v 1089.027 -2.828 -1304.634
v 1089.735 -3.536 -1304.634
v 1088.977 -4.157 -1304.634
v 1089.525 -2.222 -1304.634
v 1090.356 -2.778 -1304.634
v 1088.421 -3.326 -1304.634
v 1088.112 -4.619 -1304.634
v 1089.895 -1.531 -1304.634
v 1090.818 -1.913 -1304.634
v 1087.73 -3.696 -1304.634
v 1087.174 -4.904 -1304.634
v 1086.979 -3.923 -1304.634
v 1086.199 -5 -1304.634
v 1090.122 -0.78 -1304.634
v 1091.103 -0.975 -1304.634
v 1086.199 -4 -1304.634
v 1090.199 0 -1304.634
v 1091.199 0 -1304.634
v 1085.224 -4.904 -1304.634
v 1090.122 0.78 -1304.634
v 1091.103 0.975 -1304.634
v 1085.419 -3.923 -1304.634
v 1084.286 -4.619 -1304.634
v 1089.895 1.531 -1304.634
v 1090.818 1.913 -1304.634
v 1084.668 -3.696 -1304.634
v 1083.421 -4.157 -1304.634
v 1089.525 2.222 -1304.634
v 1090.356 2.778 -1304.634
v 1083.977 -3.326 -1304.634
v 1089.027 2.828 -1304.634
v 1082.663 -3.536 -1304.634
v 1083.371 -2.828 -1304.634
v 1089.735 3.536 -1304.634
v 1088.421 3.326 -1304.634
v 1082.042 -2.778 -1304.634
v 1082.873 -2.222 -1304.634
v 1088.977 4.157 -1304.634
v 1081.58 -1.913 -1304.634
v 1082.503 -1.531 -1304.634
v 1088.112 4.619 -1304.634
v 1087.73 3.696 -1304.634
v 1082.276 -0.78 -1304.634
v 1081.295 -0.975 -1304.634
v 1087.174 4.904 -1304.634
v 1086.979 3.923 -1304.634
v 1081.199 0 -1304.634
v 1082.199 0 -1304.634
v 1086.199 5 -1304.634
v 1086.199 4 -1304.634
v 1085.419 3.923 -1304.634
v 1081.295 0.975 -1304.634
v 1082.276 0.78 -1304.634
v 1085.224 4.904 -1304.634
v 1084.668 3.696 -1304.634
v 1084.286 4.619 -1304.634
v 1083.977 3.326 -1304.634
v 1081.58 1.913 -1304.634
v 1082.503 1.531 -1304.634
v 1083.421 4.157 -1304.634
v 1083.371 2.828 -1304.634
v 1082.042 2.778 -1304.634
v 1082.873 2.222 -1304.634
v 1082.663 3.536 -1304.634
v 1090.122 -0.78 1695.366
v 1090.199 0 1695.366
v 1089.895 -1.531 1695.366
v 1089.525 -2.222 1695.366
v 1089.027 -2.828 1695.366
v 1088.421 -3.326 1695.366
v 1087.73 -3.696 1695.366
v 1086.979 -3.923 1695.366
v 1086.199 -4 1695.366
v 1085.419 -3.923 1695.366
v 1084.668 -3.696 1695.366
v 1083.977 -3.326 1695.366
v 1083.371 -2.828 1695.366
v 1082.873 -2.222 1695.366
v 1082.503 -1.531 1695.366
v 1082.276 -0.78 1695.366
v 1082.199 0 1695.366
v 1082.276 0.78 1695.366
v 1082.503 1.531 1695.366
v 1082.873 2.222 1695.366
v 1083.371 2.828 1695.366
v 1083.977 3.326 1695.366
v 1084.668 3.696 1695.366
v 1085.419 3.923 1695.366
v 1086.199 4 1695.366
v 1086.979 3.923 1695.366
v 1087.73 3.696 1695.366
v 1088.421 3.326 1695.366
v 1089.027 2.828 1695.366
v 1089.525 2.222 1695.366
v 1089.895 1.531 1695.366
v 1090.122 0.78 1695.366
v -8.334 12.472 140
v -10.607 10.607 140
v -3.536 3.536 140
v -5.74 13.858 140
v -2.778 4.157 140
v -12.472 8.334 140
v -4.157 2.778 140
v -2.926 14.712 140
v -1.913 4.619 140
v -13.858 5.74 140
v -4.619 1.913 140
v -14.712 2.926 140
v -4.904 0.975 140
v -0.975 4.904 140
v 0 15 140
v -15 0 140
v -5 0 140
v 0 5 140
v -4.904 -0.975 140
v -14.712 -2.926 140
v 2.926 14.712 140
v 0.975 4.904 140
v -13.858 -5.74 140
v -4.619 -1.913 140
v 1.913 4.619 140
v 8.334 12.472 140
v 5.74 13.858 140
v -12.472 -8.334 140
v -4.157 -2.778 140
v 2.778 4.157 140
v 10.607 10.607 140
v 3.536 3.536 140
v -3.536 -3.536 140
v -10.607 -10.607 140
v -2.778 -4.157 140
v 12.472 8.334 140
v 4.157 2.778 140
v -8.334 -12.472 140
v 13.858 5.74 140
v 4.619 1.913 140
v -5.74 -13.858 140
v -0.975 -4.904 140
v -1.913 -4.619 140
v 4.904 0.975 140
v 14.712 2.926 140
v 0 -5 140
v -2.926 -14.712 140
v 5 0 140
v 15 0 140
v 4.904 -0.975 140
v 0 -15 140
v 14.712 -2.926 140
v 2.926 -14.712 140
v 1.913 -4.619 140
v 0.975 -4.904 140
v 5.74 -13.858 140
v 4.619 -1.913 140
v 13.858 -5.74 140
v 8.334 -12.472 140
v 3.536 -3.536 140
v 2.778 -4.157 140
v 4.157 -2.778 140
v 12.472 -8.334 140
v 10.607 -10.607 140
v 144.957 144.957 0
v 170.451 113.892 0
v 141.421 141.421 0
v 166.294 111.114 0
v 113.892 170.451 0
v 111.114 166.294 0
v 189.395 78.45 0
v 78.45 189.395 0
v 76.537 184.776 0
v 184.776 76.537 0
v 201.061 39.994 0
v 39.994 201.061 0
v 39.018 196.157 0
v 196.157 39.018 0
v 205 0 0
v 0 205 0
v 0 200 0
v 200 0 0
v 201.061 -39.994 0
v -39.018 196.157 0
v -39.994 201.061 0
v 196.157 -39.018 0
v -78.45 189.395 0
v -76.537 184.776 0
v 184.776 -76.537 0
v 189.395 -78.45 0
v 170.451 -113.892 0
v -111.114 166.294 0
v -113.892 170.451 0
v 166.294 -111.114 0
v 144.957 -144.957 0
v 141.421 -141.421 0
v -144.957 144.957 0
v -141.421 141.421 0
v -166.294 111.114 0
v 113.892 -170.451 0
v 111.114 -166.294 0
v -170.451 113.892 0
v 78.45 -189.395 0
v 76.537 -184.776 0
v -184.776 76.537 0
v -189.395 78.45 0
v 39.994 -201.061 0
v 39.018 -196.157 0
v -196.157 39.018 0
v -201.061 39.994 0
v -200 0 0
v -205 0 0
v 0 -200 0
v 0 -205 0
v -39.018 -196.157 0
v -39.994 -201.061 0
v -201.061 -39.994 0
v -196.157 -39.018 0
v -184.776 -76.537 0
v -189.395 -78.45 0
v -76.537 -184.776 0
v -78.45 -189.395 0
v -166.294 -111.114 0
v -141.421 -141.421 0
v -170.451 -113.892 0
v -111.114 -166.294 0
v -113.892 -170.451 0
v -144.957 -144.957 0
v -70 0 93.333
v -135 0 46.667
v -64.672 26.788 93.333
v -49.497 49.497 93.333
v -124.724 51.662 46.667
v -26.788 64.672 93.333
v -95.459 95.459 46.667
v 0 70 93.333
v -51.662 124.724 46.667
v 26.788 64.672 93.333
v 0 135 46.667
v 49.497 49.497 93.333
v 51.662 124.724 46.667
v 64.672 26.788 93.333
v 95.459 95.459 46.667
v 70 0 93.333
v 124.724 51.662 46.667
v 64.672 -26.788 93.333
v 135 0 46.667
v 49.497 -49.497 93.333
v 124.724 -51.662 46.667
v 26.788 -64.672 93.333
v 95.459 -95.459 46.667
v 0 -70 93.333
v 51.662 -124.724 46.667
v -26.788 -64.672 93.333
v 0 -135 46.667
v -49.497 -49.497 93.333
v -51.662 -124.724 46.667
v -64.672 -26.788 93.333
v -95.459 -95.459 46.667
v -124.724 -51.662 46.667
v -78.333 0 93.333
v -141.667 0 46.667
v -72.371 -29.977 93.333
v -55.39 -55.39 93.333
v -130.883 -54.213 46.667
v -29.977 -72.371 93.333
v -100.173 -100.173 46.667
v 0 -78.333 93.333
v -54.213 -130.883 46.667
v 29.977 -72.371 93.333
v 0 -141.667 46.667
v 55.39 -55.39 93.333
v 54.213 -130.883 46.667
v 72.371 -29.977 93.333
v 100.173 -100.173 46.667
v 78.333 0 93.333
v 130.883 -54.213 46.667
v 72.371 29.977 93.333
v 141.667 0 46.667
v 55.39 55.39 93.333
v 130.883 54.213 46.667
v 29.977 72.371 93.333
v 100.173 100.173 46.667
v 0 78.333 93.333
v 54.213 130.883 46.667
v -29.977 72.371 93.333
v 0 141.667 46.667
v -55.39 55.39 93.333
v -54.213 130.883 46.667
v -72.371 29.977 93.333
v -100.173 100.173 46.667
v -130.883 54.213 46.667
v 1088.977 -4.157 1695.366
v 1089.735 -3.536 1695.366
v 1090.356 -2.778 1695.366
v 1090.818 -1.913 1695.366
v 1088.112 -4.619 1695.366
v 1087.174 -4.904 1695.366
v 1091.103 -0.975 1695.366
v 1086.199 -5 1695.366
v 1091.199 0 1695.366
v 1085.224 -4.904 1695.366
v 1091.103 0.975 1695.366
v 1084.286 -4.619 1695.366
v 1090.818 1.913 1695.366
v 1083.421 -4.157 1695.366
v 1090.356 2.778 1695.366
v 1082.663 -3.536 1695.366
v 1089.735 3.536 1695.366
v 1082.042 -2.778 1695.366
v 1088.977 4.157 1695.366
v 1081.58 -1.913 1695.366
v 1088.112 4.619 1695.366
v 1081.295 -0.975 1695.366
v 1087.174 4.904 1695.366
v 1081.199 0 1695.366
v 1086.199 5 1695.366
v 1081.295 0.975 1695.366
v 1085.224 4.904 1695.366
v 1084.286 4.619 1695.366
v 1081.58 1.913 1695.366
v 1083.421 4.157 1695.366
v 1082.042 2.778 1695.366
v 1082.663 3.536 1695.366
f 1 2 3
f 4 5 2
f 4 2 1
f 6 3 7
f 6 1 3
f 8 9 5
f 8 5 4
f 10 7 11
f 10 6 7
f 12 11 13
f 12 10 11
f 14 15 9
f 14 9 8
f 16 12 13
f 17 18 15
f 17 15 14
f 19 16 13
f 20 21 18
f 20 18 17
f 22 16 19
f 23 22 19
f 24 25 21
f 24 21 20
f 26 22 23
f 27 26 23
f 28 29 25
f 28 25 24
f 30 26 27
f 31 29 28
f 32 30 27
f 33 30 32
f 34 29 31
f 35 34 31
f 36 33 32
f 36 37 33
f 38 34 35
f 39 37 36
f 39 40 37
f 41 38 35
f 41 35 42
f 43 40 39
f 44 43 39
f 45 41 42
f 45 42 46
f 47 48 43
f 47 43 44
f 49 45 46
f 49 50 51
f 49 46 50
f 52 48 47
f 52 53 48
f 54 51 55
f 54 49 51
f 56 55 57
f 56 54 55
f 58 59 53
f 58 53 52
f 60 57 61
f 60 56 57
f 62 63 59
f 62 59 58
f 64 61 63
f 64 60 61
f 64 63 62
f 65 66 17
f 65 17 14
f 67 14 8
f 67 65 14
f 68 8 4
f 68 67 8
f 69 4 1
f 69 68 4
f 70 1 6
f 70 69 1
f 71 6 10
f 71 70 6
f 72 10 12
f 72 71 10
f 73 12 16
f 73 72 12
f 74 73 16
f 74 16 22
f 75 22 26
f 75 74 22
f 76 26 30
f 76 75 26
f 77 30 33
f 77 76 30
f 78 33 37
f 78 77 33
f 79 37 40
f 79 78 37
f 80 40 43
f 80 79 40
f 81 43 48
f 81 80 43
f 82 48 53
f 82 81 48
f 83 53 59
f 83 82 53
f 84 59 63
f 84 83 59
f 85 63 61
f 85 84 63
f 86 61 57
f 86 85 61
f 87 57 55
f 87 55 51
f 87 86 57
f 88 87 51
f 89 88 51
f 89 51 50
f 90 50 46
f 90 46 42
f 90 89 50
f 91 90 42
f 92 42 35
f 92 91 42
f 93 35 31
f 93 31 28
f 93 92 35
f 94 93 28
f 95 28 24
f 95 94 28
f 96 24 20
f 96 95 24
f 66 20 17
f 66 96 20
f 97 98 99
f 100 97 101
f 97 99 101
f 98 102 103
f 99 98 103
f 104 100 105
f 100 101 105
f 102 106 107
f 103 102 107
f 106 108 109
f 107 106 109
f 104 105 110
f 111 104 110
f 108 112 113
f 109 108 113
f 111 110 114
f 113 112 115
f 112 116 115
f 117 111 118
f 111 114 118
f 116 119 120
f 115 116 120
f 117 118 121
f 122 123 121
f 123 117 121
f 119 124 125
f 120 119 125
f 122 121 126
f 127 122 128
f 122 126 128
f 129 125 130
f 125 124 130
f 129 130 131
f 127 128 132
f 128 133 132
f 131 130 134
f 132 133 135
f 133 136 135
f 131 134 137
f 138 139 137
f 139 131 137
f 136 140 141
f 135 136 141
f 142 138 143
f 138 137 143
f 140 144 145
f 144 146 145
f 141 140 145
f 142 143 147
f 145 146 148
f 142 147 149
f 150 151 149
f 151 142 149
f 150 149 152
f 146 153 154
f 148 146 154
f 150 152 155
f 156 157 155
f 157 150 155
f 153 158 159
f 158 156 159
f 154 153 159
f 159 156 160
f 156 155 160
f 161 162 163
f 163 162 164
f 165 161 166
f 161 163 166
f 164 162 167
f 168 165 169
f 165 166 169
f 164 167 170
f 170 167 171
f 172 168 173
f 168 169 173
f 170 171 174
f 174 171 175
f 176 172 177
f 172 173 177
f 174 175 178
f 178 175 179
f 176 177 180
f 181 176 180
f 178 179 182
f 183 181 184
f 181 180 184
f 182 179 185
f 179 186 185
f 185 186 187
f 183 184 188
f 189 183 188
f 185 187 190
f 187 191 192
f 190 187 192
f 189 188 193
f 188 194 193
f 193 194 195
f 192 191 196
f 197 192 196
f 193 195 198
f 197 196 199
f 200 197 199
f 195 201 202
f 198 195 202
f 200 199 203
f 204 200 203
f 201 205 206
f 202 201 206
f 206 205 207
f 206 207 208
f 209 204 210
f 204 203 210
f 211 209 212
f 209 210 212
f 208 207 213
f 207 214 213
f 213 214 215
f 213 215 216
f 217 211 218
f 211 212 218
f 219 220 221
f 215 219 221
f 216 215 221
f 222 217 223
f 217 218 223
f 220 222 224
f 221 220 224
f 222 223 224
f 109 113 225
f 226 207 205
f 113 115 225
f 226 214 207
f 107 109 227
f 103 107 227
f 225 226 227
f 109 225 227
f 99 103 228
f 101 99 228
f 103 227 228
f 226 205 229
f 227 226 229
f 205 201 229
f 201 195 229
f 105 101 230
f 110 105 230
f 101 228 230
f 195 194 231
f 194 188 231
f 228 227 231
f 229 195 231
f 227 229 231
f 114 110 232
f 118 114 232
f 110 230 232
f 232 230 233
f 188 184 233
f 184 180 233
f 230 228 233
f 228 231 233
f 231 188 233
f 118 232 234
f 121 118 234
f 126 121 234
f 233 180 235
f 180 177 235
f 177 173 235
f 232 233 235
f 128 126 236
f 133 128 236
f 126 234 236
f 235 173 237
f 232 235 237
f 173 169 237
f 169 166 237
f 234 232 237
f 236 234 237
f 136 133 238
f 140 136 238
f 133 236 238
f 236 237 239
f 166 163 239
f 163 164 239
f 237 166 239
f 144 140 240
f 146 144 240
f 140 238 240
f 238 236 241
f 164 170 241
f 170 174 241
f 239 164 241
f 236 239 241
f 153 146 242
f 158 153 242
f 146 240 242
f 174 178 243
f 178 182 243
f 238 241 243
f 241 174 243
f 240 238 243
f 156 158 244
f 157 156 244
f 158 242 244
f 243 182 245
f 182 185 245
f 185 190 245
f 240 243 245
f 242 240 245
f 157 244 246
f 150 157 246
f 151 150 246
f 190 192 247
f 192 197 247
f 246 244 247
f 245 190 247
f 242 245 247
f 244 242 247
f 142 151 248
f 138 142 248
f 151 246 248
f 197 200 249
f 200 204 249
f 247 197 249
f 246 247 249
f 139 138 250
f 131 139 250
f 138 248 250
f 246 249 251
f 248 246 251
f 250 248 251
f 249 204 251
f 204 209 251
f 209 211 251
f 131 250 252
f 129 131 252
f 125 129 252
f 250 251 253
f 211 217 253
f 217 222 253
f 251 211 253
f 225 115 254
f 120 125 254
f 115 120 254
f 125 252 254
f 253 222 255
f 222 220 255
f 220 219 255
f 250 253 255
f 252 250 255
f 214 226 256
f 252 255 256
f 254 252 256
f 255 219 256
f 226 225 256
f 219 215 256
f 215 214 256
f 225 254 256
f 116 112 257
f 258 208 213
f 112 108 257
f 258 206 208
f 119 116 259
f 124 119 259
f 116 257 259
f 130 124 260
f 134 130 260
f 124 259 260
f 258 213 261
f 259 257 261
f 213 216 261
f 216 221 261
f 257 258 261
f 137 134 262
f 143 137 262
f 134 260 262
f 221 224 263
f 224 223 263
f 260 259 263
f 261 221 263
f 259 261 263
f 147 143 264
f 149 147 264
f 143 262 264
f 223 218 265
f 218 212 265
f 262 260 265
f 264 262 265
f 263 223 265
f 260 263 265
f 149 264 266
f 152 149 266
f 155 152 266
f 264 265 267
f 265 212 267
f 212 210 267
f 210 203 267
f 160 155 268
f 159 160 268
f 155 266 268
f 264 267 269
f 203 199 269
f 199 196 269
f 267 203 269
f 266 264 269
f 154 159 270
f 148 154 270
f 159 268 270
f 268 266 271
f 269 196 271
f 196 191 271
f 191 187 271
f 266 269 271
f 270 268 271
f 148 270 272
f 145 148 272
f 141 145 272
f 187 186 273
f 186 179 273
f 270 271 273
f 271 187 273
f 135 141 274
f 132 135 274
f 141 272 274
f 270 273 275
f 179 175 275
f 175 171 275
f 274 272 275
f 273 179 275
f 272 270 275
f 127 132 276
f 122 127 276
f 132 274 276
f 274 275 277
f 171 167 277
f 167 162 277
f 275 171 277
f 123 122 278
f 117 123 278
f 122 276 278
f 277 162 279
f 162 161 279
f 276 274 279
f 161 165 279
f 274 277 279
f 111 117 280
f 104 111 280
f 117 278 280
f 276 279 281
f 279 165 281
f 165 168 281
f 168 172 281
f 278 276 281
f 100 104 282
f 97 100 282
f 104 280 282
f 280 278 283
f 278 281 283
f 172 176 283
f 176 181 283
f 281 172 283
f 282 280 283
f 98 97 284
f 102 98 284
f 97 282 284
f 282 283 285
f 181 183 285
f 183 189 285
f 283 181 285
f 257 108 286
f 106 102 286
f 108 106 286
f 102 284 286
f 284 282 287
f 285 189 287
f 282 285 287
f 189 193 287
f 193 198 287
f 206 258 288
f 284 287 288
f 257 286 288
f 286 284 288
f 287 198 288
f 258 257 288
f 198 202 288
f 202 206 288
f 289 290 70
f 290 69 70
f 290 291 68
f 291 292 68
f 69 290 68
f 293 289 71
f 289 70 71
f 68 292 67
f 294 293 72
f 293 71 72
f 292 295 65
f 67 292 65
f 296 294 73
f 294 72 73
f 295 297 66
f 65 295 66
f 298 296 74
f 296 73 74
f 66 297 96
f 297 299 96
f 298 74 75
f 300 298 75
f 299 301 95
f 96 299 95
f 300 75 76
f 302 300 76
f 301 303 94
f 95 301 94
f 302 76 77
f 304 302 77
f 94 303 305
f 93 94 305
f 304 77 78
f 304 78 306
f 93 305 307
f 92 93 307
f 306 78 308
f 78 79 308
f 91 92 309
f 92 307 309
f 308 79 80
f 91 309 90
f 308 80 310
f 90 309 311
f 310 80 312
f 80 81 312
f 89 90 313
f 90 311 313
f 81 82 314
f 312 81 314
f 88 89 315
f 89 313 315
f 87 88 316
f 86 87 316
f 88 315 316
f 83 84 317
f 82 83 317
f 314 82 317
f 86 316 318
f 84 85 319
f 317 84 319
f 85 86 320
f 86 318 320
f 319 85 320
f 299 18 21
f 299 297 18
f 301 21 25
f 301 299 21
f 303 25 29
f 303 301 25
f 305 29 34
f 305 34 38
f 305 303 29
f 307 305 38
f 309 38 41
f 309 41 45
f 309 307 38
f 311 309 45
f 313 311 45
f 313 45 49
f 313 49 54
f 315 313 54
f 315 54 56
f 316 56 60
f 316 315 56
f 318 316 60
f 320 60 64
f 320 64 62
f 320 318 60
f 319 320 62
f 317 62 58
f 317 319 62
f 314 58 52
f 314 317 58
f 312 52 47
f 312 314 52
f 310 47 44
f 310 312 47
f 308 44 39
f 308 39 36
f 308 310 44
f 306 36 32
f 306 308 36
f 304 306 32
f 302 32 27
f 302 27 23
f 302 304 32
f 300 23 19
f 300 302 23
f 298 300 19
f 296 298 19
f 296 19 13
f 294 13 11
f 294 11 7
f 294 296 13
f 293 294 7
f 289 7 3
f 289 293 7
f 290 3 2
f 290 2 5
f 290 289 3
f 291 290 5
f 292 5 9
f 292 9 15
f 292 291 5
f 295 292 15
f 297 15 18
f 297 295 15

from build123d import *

# Parameters (mm, degrees)
F4_W = 5
F4_H = 3000
F6_W = 4
F6_H = 3000.007538


with BuildPart() as f1:
    # F0 (on Front) → F1 (revolve)
    with BuildSketch(Plane.XZ):
        Polygon((-205, 0), (0, 0), (0, 140), (-15, 140), align=None)
    revolve(axis=Axis((0, 0, 70), (0, 0, 1)))

    # F2 (on Front) → F3 (revolve, cut)
    with BuildSketch(Plane.XZ):
        Polygon((-5, 140), (-200, 0), (0, 0), (0, 140), align=None)
    revolve(axis=Axis((0, 0, 70), (0, 0, -1)), mode=Mode.SUBTRACT)


with BuildPart() as f5:
    # F4 (on Front) → F5 (revolve)
    with BuildSketch(Plane.XZ):
        with Locations((1088.699011, 195.366355)):
            Rectangle(F4_W, F4_H)
    revolve(axis=Axis((1086.199011, 0, 195.366355), (0, 0, 1)))

    # F6 (on Front) → F7 (revolve, cut)
    with BuildSketch(Plane.XZ):
        with Locations((1088.199011, 195.370124)):
            Rectangle(F6_W, F6_H)
    revolve(axis=Axis((1086.199011, 0, 195.370124), (0, 0, -1)), mode=Mode.SUBTRACT)


solid = Compound([f1.part, f5.part])
